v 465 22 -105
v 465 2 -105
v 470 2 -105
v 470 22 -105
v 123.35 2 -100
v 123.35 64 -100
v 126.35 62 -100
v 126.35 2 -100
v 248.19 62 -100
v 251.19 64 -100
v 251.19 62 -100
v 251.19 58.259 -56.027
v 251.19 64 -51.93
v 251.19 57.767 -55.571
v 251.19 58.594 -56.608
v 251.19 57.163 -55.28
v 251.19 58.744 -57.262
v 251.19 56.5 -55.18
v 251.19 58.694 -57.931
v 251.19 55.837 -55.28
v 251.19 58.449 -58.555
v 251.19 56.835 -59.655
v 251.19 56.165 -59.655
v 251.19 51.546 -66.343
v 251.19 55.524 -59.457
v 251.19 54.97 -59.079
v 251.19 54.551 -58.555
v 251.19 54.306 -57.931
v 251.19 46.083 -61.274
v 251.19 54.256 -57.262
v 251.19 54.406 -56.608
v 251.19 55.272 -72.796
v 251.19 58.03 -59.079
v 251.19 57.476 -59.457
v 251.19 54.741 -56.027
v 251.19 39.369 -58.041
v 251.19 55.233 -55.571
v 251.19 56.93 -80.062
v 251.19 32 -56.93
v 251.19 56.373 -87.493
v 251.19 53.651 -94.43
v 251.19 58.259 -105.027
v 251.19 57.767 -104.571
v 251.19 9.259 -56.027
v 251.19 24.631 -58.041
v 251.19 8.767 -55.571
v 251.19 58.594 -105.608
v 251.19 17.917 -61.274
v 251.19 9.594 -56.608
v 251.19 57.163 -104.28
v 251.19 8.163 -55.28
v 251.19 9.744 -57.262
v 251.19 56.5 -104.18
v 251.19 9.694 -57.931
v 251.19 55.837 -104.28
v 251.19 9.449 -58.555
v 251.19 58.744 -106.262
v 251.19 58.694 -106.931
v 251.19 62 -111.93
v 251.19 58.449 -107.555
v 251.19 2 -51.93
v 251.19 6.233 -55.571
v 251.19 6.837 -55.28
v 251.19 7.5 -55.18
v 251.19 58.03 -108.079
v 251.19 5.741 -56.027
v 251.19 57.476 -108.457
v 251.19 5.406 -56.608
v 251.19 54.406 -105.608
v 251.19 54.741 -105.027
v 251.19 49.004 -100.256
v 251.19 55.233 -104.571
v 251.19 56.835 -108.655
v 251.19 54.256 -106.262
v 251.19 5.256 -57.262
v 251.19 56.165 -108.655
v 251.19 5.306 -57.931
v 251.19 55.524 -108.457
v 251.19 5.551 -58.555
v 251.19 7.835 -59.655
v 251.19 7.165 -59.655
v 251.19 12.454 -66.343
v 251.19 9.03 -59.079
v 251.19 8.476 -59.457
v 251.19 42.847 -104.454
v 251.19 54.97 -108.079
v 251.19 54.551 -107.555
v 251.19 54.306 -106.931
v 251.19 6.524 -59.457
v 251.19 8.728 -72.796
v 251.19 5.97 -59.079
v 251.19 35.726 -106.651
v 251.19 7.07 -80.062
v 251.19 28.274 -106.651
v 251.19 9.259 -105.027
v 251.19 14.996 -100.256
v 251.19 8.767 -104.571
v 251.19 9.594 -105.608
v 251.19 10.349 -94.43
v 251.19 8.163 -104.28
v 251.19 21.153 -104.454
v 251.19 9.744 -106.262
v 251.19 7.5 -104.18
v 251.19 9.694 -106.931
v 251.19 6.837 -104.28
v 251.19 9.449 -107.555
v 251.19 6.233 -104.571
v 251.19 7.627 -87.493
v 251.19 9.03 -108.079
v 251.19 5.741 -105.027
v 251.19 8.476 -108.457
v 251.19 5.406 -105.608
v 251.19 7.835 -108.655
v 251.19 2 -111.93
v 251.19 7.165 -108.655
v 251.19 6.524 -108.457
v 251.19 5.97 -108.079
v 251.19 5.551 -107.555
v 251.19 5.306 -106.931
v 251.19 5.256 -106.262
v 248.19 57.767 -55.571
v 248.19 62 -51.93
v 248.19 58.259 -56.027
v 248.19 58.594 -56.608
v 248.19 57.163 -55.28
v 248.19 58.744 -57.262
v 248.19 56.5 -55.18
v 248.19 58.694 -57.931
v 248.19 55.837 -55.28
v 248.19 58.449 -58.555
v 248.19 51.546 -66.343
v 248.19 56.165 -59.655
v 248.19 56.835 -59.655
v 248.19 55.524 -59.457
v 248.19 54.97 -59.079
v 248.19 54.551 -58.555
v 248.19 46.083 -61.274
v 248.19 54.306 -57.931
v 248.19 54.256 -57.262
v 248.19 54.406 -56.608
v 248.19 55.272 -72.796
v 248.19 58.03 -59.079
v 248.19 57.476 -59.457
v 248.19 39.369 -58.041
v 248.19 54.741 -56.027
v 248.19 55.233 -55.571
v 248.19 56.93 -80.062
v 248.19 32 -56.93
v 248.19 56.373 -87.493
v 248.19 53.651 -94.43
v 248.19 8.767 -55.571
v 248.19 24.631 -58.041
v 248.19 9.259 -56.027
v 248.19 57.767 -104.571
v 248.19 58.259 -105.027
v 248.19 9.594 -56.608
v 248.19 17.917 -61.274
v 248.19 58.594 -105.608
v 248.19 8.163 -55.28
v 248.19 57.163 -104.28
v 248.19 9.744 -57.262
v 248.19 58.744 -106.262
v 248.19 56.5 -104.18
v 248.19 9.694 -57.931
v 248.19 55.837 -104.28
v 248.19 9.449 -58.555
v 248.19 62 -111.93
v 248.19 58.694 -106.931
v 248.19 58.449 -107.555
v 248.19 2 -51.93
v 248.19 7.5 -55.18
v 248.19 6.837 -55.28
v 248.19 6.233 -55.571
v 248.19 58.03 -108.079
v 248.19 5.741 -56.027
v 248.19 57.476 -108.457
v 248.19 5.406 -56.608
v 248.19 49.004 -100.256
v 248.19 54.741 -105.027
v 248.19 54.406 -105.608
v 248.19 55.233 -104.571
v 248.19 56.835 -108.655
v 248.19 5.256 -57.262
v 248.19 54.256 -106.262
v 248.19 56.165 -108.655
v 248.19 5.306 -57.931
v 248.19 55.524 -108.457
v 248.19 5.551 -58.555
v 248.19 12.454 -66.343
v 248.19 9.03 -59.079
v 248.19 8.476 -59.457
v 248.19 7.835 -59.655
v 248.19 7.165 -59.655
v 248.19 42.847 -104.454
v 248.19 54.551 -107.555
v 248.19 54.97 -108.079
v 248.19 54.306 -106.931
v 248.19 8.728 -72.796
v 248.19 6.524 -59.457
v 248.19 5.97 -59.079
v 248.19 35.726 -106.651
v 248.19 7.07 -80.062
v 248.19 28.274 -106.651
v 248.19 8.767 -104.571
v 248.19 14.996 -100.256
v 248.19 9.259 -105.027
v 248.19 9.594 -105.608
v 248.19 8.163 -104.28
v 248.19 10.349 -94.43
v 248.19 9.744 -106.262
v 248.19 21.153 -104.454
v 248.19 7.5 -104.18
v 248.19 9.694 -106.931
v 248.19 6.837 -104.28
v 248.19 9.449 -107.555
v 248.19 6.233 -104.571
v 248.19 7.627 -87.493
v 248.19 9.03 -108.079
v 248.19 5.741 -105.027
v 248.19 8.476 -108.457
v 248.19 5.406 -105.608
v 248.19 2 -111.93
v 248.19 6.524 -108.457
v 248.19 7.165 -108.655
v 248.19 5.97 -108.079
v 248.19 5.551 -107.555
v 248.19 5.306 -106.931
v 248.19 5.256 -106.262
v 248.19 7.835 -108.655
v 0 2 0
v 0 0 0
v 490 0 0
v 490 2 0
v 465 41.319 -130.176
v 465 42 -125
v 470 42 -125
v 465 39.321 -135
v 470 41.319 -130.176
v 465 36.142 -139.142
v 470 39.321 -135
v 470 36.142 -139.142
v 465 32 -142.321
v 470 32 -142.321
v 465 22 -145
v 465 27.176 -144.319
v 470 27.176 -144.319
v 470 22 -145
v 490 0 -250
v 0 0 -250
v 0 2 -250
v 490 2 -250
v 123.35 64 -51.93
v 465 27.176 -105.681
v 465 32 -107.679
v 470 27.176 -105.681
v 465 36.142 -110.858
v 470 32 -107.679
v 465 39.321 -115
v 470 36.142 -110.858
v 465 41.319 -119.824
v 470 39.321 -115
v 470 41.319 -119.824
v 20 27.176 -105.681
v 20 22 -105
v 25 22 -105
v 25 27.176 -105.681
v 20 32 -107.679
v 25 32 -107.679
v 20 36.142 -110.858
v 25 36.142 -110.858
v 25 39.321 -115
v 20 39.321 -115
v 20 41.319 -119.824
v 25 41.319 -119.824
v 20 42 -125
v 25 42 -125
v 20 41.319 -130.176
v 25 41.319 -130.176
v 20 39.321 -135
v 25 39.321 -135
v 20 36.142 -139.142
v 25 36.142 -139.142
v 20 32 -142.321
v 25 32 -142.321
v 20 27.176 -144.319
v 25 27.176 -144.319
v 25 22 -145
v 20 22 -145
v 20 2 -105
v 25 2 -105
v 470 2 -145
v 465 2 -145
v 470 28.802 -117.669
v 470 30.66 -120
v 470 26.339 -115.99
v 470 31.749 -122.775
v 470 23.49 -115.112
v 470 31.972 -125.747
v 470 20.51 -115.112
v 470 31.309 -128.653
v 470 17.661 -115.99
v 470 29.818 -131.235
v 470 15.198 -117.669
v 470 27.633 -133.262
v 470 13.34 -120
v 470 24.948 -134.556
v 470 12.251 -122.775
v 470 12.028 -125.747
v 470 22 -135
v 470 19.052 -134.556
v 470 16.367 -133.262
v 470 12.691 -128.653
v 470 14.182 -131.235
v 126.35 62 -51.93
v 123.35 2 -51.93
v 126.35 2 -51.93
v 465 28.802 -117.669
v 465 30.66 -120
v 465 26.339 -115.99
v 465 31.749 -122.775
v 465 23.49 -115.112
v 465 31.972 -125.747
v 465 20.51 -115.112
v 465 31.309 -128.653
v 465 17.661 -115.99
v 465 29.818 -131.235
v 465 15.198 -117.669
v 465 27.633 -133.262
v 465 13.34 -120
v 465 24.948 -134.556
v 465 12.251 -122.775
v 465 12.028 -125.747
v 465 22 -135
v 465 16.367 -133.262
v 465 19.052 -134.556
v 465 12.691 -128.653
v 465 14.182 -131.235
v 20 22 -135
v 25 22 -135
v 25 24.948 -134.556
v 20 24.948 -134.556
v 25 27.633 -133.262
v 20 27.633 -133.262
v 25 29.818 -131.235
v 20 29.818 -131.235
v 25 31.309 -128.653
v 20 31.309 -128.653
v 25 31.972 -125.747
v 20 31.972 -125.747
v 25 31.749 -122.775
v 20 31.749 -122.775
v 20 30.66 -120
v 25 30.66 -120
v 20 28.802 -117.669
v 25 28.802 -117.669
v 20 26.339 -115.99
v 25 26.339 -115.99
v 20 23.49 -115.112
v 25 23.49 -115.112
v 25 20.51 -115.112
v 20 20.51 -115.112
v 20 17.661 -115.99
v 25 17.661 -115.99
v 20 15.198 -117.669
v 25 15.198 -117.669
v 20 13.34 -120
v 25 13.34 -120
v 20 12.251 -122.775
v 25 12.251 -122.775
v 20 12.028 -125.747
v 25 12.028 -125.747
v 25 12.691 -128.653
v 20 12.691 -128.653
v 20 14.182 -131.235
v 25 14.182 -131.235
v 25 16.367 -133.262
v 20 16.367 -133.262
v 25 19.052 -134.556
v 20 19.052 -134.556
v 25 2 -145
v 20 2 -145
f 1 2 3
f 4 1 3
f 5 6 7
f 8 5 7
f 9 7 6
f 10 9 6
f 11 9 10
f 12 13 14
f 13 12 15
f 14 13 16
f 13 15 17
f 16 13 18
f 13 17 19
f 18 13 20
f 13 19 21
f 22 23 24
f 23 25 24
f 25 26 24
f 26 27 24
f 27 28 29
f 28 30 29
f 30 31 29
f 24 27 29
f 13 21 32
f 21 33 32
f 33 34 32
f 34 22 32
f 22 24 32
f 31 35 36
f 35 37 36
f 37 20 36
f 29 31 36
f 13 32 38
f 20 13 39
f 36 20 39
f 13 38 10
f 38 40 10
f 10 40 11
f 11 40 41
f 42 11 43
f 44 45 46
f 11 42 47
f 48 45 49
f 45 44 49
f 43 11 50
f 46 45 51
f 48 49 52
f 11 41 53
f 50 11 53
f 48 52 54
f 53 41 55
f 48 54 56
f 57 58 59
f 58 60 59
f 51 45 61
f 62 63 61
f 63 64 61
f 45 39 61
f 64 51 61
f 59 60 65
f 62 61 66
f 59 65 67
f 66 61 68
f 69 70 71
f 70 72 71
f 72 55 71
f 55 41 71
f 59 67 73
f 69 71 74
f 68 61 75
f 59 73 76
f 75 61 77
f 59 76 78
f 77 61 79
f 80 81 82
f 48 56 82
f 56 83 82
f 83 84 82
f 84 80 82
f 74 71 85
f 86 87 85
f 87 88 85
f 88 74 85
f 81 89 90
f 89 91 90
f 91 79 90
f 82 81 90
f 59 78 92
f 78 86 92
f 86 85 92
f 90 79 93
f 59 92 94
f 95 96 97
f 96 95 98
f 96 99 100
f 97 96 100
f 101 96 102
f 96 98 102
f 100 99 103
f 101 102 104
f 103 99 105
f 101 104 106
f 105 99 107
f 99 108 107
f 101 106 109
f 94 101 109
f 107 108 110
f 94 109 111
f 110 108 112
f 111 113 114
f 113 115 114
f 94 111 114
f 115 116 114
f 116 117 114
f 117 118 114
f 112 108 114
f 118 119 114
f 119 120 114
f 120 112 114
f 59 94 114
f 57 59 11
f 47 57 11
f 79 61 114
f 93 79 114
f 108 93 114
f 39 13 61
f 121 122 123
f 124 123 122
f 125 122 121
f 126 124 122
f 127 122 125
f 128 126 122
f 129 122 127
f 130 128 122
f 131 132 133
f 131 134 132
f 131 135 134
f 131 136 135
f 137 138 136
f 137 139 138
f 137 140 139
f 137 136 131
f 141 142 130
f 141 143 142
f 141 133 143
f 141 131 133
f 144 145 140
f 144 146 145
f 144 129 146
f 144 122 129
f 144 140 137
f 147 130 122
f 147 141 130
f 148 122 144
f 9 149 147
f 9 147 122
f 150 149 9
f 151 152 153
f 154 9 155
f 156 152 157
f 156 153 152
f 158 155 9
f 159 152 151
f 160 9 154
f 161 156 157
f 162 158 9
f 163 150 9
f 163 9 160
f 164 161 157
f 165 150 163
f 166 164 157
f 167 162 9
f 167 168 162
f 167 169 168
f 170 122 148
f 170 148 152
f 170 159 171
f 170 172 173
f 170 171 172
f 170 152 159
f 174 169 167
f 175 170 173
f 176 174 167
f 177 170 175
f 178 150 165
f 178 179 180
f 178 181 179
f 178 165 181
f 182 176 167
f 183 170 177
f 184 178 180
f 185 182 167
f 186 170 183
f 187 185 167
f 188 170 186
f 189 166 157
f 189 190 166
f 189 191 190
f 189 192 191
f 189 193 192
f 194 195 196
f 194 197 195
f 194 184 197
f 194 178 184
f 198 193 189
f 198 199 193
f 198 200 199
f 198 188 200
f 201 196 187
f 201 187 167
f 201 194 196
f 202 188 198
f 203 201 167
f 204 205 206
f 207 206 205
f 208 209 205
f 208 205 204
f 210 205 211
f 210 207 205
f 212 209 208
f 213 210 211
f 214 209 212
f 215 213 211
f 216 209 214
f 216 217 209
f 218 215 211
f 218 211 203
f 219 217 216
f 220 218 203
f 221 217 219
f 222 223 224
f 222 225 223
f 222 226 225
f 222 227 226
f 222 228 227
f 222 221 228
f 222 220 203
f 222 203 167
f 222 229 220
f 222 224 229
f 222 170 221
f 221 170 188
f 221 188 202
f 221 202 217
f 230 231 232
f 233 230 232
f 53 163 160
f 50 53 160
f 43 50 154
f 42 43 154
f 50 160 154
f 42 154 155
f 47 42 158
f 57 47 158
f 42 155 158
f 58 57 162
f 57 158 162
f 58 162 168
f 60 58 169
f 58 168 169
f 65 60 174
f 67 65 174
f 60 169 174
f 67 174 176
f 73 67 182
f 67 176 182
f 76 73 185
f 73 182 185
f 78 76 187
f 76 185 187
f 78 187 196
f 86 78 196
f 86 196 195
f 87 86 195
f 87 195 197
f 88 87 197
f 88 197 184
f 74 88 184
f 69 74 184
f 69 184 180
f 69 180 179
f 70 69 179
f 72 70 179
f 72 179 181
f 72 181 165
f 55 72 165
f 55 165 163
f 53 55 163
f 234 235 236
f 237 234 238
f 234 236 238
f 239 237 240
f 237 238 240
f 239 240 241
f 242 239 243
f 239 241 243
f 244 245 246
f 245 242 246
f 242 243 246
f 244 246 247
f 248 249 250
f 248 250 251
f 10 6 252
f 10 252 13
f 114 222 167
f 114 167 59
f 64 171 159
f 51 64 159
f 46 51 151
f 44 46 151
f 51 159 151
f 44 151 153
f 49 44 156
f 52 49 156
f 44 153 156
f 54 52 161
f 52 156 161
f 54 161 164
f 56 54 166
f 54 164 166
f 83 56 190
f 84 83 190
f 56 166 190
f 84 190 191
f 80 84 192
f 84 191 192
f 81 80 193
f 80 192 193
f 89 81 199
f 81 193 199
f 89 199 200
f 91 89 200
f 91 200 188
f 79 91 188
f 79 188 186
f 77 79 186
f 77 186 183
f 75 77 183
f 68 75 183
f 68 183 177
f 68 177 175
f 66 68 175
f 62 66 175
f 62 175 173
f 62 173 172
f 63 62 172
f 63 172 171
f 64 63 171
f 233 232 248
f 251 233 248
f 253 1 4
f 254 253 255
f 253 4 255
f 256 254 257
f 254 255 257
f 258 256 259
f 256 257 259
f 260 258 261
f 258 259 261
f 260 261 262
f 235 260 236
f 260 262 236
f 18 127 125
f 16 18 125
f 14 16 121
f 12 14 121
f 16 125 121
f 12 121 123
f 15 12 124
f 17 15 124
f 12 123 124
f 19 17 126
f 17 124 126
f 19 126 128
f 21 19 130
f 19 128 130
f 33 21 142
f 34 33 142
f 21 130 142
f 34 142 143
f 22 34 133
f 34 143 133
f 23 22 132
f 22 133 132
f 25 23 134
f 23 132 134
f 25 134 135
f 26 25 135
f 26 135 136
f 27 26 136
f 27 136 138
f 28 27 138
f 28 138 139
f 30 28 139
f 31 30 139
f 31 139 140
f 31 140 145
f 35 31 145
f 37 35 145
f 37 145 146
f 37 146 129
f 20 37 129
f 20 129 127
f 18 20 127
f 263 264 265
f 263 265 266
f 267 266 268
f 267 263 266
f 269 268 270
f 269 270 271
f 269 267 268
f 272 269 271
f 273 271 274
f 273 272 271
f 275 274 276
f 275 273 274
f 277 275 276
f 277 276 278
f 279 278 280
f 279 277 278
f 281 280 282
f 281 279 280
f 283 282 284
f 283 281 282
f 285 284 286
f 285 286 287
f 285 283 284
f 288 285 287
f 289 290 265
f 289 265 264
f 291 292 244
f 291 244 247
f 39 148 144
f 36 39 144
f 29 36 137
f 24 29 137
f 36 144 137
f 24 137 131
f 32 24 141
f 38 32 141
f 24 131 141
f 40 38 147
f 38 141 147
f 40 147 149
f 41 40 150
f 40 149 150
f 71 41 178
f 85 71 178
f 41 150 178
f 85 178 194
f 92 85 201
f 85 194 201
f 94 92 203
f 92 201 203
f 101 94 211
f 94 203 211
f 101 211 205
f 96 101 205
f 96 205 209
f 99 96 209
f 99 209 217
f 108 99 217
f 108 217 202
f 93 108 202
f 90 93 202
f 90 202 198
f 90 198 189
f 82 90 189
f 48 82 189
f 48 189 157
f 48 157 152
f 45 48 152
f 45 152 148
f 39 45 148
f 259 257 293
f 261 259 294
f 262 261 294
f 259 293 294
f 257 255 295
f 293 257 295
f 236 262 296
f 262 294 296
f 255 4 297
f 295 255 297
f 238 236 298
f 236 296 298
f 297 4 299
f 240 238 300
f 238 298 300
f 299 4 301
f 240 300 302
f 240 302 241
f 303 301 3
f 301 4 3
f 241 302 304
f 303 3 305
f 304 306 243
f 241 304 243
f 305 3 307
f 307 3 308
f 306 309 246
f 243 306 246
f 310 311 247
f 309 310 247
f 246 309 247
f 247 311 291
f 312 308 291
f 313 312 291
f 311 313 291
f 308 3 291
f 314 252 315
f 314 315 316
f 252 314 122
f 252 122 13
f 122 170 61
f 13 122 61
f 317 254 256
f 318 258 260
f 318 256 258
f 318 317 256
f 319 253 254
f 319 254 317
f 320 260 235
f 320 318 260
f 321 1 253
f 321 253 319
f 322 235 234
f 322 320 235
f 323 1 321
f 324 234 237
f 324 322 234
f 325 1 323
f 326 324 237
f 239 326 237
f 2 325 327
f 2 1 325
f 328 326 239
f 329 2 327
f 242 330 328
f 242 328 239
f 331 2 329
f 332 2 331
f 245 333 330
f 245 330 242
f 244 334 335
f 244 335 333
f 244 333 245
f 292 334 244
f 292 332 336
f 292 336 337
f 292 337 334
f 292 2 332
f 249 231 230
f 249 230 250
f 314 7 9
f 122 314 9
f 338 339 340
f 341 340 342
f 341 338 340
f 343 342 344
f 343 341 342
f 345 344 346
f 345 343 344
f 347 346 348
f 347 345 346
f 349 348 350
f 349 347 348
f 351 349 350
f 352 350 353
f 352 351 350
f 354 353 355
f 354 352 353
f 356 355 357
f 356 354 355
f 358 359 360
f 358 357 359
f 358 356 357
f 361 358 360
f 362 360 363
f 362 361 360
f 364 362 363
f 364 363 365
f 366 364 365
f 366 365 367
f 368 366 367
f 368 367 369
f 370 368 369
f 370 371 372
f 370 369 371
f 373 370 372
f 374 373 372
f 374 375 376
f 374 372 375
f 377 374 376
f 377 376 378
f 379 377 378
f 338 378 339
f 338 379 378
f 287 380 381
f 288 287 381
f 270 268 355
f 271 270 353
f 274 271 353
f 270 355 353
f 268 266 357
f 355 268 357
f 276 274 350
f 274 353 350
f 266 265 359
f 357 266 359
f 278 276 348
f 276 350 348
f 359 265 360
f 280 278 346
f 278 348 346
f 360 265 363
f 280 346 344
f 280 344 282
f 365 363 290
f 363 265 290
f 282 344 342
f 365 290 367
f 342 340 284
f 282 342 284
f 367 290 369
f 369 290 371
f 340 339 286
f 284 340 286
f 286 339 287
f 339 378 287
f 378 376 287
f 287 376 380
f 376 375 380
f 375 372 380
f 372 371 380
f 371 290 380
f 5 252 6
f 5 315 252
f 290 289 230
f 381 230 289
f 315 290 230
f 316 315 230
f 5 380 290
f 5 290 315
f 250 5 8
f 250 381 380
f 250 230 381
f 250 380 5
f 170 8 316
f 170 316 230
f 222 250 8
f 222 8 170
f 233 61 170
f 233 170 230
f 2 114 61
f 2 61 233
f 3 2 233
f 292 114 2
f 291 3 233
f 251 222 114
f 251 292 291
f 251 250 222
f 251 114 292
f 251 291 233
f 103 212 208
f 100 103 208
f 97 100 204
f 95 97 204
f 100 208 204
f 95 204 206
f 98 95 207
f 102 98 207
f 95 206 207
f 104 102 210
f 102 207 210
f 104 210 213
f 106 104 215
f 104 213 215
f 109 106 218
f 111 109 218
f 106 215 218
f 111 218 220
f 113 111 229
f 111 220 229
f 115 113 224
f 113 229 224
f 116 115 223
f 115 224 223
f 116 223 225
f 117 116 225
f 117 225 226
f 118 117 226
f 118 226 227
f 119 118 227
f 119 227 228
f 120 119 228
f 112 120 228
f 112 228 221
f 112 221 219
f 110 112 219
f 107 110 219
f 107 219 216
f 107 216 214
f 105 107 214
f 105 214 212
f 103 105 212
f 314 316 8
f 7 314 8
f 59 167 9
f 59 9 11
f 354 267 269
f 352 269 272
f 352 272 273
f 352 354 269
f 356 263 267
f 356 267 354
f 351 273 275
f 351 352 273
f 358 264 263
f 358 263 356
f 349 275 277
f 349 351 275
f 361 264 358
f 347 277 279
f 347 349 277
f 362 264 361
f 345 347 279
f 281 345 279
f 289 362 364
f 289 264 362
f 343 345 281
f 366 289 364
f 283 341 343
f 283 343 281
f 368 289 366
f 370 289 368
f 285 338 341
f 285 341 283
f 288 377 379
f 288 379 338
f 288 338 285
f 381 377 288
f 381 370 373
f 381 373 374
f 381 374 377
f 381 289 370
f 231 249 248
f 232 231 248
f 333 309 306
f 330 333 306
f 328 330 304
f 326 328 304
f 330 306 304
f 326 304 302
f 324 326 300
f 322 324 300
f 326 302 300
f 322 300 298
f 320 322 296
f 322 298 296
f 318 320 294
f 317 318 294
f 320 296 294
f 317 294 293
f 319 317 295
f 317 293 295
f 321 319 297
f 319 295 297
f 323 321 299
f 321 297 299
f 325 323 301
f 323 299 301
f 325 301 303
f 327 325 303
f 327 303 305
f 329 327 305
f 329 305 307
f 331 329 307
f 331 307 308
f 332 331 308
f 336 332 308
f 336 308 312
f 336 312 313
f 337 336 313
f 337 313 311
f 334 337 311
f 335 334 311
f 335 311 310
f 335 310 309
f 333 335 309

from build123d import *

# Parameters (mm, degrees)
SKETCH_1_W          = 490
SKETCH_1_H          = 250
EXTRUDE_1_DEPTH     = 2
SKETCH_2_W          = 5
SKETCH_2_H          = 40
EXTRUDE_2_DEPTH     = 40
CUT_EXTRUDE_1_DEPTH = 40
SKETCH_4_R          = 10
CUT_EXTRUDE_2_DEPTH = 40
SKETCH_5_W          = 3
SKETCH_5_H          = 60
EXTRUDE_3_DEPTH     = 60
CUT_EXTRUDE_3_REACH = 359.69
SKETCH_6_R          = 25
CUT_EXTRUDE_4_REACH = 359.69
SKETCH_7_R          = 2.25
SKETCH_9_W          = 3
SKETCH_9_H          = 48.07
EXTRUDE_4_DEPTH     = 60
SKETCH_10_W         = 127.84
SKETCH_10_H         = 48.07
EXTRUDE_5_DEPTH     = 2


with BuildPart() as part:
    # 草图1 → 凸台-拉伸1 (new body)
    with BuildSketch(Plane(origin=(0, 0, 0), x_dir=(1, 0, 0), z_dir=(0, 1, 0))):
        with Locations((245, 125)):
            Rectangle(SKETCH_1_W, SKETCH_1_H)
    extrude(amount=EXTRUDE_1_DEPTH)

    # 草图2 → 凸台-拉伸2 (add)
    with BuildSketch(Plane(origin=(0, 2, 0), x_dir=(1, 0, 0), z_dir=(0, 1, 0))):
        with Locations((467.5, 125)):
            Rectangle(SKETCH_2_W, SKETCH_2_H)
    extrude_2 = extrude(amount=EXTRUDE_2_DEPTH)

    # 草图3 → 切除-拉伸1 (cut)
    with BuildSketch(Plane(origin=(470, 0, 0), x_dir=(0, 0, -1), z_dir=(1, 0, 0))):
        with BuildLine():
            ThreePointArc((105, 22), (110.857864376, 36.142135624), (125, 42))
            Line((125, 42), (105, 42))
            Line((105, 42), (105, 22))
        make_face()
        with BuildLine():
            Line((145, 42), (125, 42))
            ThreePointArc((125, 42), (139.142135624, 36.142135624), (145, 22))
            Line((145, 22), (145, 42))
        make_face()
    cut_extrude_1 = extrude(amount=-CUT_EXTRUDE_1_DEPTH, mode=Mode.SUBTRACT)

    # 草图4 → 切除-拉伸2 (cut)
    with BuildSketch(Plane(origin=(470, 0, 0), x_dir=(0, 0, -1), z_dir=(1, 0, 0))):
        with Locations((125, 22)):
            Circle(SKETCH_4_R)
    cut_extrude_2 = extrude(amount=-CUT_EXTRUDE_2_DEPTH, mode=Mode.SUBTRACT)

    # 镜向1: 凸台-拉伸2, 切除-拉伸1, 切除-拉伸2 across plane
    add(extrude_2.mirror(Plane(origin=(245, 0, 0), x_dir=(0, 0, 1), z_dir=(1, 0, 0))))
    add(cut_extrude_1.mirror(Plane(origin=(245, 0, 0), x_dir=(0, 0, 1), z_dir=(1, 0, 0))), mode=Mode.SUBTRACT)
    add(cut_extrude_2.mirror(Plane(origin=(245, 0, 0), x_dir=(0, 0, 1), z_dir=(1, 0, 0))), mode=Mode.SUBTRACT)

    # 草图5 → 凸台-拉伸3 (add)
    with BuildSketch(Plane(origin=(0, 2, 0), x_dir=(1, 0, 0), z_dir=(0, 1, 0))):
        with Locations((249.69, 81.93)):
            Rectangle(SKETCH_5_W, SKETCH_5_H)
    extrude(amount=EXTRUDE_3_DEPTH)

    # 草图6 → 切除-拉伸3 (cut, up to next)
    with BuildSketch(Plane.ZY.offset(-248.19), mode=Mode.PRIVATE) as cut_extrude_3_sk1:
        with Locations((-81.93, 32)):
            Circle(SKETCH_6_R)
    cut_extrude_3_tool1 = extrude(cut_extrude_3_sk1.sketch, amount=-CUT_EXTRUDE_3_REACH, mode=Mode.PRIVATE) & part.part
    add(cut_extrude_3_tool1.solids().sort_by_distance((248.19, 32, -81.93))[0], mode=Mode.SUBTRACT)

    # 草图7 → 切除-拉伸4 (cut, up to next)
    with BuildSketch(Plane.ZY.offset(-248.19), mode=Mode.PRIVATE) as cut_extrude_4_sk1:
        with Locations((-57.43, 56.5)):
            Circle(SKETCH_7_R)
    cut_extrude_4_tool1 = extrude(cut_extrude_4_sk1.sketch, amount=-CUT_EXTRUDE_4_REACH, mode=Mode.PRIVATE) & part.part
    # 草图7 → 切除-拉伸4 (cut, up to next)
    with BuildSketch(Plane.ZY.offset(-248.19), mode=Mode.PRIVATE) as cut_extrude_4_sk2:
        with Locations((-57.43, 7.5)):
            Circle(SKETCH_7_R)
    cut_extrude_4_tool2 = extrude(cut_extrude_4_sk2.sketch, amount=-CUT_EXTRUDE_4_REACH, mode=Mode.PRIVATE) & part.part
    # 草图7 → 切除-拉伸4 (cut, up to next)
    with BuildSketch(Plane.ZY.offset(-248.19), mode=Mode.PRIVATE) as cut_extrude_4_sk3:
        with Locations((-106.43, 7.5)):
            Circle(SKETCH_7_R)
    cut_extrude_4_tool3 = extrude(cut_extrude_4_sk3.sketch, amount=-CUT_EXTRUDE_4_REACH, mode=Mode.PRIVATE) & part.part
    # 草图7 → 切除-拉伸4 (cut, up to next)
    with BuildSketch(Plane.ZY.offset(-248.19), mode=Mode.PRIVATE) as cut_extrude_4_sk4:
        with Locations((-106.43, 56.5)):
            Circle(SKETCH_7_R)
    cut_extrude_4_tool4 = extrude(cut_extrude_4_sk4.sketch, amount=-CUT_EXTRUDE_4_REACH, mode=Mode.PRIVATE) & part.part
    add(cut_extrude_4_tool1.solids().sort_by_distance((248.19, 56.5, -57.43))[0], mode=Mode.SUBTRACT)
    add(cut_extrude_4_tool2.solids().sort_by_distance((248.19, 7.5, -57.43))[0], mode=Mode.SUBTRACT)
    add(cut_extrude_4_tool3.solids().sort_by_distance((248.19, 7.5, -106.43))[0], mode=Mode.SUBTRACT)
    add(cut_extrude_4_tool4.solids().sort_by_distance((248.19, 56.5, -106.43))[0], mode=Mode.SUBTRACT)

    # 草图9 → 凸台-拉伸4 (add)
    with BuildSketch(Plane(origin=(0, 2, 0), x_dir=(1, 0, 0), z_dir=(0, 1, 0))):
        with Locations((124.85, 75.965)):
            Rectangle(SKETCH_9_W, SKETCH_9_H)
    extrude(amount=EXTRUDE_4_DEPTH)

    # 草图10 → 凸台-拉伸5 (add)
    with BuildSketch(Plane(origin=(0, 62, 0), x_dir=(1, 0, 0), z_dir=(0, 1, 0))):
        with Locations((187.27, 75.965)):
            Rectangle(SKETCH_10_W, SKETCH_10_H)
    extrude(amount=EXTRUDE_5_DEPTH)


solid = part.part
